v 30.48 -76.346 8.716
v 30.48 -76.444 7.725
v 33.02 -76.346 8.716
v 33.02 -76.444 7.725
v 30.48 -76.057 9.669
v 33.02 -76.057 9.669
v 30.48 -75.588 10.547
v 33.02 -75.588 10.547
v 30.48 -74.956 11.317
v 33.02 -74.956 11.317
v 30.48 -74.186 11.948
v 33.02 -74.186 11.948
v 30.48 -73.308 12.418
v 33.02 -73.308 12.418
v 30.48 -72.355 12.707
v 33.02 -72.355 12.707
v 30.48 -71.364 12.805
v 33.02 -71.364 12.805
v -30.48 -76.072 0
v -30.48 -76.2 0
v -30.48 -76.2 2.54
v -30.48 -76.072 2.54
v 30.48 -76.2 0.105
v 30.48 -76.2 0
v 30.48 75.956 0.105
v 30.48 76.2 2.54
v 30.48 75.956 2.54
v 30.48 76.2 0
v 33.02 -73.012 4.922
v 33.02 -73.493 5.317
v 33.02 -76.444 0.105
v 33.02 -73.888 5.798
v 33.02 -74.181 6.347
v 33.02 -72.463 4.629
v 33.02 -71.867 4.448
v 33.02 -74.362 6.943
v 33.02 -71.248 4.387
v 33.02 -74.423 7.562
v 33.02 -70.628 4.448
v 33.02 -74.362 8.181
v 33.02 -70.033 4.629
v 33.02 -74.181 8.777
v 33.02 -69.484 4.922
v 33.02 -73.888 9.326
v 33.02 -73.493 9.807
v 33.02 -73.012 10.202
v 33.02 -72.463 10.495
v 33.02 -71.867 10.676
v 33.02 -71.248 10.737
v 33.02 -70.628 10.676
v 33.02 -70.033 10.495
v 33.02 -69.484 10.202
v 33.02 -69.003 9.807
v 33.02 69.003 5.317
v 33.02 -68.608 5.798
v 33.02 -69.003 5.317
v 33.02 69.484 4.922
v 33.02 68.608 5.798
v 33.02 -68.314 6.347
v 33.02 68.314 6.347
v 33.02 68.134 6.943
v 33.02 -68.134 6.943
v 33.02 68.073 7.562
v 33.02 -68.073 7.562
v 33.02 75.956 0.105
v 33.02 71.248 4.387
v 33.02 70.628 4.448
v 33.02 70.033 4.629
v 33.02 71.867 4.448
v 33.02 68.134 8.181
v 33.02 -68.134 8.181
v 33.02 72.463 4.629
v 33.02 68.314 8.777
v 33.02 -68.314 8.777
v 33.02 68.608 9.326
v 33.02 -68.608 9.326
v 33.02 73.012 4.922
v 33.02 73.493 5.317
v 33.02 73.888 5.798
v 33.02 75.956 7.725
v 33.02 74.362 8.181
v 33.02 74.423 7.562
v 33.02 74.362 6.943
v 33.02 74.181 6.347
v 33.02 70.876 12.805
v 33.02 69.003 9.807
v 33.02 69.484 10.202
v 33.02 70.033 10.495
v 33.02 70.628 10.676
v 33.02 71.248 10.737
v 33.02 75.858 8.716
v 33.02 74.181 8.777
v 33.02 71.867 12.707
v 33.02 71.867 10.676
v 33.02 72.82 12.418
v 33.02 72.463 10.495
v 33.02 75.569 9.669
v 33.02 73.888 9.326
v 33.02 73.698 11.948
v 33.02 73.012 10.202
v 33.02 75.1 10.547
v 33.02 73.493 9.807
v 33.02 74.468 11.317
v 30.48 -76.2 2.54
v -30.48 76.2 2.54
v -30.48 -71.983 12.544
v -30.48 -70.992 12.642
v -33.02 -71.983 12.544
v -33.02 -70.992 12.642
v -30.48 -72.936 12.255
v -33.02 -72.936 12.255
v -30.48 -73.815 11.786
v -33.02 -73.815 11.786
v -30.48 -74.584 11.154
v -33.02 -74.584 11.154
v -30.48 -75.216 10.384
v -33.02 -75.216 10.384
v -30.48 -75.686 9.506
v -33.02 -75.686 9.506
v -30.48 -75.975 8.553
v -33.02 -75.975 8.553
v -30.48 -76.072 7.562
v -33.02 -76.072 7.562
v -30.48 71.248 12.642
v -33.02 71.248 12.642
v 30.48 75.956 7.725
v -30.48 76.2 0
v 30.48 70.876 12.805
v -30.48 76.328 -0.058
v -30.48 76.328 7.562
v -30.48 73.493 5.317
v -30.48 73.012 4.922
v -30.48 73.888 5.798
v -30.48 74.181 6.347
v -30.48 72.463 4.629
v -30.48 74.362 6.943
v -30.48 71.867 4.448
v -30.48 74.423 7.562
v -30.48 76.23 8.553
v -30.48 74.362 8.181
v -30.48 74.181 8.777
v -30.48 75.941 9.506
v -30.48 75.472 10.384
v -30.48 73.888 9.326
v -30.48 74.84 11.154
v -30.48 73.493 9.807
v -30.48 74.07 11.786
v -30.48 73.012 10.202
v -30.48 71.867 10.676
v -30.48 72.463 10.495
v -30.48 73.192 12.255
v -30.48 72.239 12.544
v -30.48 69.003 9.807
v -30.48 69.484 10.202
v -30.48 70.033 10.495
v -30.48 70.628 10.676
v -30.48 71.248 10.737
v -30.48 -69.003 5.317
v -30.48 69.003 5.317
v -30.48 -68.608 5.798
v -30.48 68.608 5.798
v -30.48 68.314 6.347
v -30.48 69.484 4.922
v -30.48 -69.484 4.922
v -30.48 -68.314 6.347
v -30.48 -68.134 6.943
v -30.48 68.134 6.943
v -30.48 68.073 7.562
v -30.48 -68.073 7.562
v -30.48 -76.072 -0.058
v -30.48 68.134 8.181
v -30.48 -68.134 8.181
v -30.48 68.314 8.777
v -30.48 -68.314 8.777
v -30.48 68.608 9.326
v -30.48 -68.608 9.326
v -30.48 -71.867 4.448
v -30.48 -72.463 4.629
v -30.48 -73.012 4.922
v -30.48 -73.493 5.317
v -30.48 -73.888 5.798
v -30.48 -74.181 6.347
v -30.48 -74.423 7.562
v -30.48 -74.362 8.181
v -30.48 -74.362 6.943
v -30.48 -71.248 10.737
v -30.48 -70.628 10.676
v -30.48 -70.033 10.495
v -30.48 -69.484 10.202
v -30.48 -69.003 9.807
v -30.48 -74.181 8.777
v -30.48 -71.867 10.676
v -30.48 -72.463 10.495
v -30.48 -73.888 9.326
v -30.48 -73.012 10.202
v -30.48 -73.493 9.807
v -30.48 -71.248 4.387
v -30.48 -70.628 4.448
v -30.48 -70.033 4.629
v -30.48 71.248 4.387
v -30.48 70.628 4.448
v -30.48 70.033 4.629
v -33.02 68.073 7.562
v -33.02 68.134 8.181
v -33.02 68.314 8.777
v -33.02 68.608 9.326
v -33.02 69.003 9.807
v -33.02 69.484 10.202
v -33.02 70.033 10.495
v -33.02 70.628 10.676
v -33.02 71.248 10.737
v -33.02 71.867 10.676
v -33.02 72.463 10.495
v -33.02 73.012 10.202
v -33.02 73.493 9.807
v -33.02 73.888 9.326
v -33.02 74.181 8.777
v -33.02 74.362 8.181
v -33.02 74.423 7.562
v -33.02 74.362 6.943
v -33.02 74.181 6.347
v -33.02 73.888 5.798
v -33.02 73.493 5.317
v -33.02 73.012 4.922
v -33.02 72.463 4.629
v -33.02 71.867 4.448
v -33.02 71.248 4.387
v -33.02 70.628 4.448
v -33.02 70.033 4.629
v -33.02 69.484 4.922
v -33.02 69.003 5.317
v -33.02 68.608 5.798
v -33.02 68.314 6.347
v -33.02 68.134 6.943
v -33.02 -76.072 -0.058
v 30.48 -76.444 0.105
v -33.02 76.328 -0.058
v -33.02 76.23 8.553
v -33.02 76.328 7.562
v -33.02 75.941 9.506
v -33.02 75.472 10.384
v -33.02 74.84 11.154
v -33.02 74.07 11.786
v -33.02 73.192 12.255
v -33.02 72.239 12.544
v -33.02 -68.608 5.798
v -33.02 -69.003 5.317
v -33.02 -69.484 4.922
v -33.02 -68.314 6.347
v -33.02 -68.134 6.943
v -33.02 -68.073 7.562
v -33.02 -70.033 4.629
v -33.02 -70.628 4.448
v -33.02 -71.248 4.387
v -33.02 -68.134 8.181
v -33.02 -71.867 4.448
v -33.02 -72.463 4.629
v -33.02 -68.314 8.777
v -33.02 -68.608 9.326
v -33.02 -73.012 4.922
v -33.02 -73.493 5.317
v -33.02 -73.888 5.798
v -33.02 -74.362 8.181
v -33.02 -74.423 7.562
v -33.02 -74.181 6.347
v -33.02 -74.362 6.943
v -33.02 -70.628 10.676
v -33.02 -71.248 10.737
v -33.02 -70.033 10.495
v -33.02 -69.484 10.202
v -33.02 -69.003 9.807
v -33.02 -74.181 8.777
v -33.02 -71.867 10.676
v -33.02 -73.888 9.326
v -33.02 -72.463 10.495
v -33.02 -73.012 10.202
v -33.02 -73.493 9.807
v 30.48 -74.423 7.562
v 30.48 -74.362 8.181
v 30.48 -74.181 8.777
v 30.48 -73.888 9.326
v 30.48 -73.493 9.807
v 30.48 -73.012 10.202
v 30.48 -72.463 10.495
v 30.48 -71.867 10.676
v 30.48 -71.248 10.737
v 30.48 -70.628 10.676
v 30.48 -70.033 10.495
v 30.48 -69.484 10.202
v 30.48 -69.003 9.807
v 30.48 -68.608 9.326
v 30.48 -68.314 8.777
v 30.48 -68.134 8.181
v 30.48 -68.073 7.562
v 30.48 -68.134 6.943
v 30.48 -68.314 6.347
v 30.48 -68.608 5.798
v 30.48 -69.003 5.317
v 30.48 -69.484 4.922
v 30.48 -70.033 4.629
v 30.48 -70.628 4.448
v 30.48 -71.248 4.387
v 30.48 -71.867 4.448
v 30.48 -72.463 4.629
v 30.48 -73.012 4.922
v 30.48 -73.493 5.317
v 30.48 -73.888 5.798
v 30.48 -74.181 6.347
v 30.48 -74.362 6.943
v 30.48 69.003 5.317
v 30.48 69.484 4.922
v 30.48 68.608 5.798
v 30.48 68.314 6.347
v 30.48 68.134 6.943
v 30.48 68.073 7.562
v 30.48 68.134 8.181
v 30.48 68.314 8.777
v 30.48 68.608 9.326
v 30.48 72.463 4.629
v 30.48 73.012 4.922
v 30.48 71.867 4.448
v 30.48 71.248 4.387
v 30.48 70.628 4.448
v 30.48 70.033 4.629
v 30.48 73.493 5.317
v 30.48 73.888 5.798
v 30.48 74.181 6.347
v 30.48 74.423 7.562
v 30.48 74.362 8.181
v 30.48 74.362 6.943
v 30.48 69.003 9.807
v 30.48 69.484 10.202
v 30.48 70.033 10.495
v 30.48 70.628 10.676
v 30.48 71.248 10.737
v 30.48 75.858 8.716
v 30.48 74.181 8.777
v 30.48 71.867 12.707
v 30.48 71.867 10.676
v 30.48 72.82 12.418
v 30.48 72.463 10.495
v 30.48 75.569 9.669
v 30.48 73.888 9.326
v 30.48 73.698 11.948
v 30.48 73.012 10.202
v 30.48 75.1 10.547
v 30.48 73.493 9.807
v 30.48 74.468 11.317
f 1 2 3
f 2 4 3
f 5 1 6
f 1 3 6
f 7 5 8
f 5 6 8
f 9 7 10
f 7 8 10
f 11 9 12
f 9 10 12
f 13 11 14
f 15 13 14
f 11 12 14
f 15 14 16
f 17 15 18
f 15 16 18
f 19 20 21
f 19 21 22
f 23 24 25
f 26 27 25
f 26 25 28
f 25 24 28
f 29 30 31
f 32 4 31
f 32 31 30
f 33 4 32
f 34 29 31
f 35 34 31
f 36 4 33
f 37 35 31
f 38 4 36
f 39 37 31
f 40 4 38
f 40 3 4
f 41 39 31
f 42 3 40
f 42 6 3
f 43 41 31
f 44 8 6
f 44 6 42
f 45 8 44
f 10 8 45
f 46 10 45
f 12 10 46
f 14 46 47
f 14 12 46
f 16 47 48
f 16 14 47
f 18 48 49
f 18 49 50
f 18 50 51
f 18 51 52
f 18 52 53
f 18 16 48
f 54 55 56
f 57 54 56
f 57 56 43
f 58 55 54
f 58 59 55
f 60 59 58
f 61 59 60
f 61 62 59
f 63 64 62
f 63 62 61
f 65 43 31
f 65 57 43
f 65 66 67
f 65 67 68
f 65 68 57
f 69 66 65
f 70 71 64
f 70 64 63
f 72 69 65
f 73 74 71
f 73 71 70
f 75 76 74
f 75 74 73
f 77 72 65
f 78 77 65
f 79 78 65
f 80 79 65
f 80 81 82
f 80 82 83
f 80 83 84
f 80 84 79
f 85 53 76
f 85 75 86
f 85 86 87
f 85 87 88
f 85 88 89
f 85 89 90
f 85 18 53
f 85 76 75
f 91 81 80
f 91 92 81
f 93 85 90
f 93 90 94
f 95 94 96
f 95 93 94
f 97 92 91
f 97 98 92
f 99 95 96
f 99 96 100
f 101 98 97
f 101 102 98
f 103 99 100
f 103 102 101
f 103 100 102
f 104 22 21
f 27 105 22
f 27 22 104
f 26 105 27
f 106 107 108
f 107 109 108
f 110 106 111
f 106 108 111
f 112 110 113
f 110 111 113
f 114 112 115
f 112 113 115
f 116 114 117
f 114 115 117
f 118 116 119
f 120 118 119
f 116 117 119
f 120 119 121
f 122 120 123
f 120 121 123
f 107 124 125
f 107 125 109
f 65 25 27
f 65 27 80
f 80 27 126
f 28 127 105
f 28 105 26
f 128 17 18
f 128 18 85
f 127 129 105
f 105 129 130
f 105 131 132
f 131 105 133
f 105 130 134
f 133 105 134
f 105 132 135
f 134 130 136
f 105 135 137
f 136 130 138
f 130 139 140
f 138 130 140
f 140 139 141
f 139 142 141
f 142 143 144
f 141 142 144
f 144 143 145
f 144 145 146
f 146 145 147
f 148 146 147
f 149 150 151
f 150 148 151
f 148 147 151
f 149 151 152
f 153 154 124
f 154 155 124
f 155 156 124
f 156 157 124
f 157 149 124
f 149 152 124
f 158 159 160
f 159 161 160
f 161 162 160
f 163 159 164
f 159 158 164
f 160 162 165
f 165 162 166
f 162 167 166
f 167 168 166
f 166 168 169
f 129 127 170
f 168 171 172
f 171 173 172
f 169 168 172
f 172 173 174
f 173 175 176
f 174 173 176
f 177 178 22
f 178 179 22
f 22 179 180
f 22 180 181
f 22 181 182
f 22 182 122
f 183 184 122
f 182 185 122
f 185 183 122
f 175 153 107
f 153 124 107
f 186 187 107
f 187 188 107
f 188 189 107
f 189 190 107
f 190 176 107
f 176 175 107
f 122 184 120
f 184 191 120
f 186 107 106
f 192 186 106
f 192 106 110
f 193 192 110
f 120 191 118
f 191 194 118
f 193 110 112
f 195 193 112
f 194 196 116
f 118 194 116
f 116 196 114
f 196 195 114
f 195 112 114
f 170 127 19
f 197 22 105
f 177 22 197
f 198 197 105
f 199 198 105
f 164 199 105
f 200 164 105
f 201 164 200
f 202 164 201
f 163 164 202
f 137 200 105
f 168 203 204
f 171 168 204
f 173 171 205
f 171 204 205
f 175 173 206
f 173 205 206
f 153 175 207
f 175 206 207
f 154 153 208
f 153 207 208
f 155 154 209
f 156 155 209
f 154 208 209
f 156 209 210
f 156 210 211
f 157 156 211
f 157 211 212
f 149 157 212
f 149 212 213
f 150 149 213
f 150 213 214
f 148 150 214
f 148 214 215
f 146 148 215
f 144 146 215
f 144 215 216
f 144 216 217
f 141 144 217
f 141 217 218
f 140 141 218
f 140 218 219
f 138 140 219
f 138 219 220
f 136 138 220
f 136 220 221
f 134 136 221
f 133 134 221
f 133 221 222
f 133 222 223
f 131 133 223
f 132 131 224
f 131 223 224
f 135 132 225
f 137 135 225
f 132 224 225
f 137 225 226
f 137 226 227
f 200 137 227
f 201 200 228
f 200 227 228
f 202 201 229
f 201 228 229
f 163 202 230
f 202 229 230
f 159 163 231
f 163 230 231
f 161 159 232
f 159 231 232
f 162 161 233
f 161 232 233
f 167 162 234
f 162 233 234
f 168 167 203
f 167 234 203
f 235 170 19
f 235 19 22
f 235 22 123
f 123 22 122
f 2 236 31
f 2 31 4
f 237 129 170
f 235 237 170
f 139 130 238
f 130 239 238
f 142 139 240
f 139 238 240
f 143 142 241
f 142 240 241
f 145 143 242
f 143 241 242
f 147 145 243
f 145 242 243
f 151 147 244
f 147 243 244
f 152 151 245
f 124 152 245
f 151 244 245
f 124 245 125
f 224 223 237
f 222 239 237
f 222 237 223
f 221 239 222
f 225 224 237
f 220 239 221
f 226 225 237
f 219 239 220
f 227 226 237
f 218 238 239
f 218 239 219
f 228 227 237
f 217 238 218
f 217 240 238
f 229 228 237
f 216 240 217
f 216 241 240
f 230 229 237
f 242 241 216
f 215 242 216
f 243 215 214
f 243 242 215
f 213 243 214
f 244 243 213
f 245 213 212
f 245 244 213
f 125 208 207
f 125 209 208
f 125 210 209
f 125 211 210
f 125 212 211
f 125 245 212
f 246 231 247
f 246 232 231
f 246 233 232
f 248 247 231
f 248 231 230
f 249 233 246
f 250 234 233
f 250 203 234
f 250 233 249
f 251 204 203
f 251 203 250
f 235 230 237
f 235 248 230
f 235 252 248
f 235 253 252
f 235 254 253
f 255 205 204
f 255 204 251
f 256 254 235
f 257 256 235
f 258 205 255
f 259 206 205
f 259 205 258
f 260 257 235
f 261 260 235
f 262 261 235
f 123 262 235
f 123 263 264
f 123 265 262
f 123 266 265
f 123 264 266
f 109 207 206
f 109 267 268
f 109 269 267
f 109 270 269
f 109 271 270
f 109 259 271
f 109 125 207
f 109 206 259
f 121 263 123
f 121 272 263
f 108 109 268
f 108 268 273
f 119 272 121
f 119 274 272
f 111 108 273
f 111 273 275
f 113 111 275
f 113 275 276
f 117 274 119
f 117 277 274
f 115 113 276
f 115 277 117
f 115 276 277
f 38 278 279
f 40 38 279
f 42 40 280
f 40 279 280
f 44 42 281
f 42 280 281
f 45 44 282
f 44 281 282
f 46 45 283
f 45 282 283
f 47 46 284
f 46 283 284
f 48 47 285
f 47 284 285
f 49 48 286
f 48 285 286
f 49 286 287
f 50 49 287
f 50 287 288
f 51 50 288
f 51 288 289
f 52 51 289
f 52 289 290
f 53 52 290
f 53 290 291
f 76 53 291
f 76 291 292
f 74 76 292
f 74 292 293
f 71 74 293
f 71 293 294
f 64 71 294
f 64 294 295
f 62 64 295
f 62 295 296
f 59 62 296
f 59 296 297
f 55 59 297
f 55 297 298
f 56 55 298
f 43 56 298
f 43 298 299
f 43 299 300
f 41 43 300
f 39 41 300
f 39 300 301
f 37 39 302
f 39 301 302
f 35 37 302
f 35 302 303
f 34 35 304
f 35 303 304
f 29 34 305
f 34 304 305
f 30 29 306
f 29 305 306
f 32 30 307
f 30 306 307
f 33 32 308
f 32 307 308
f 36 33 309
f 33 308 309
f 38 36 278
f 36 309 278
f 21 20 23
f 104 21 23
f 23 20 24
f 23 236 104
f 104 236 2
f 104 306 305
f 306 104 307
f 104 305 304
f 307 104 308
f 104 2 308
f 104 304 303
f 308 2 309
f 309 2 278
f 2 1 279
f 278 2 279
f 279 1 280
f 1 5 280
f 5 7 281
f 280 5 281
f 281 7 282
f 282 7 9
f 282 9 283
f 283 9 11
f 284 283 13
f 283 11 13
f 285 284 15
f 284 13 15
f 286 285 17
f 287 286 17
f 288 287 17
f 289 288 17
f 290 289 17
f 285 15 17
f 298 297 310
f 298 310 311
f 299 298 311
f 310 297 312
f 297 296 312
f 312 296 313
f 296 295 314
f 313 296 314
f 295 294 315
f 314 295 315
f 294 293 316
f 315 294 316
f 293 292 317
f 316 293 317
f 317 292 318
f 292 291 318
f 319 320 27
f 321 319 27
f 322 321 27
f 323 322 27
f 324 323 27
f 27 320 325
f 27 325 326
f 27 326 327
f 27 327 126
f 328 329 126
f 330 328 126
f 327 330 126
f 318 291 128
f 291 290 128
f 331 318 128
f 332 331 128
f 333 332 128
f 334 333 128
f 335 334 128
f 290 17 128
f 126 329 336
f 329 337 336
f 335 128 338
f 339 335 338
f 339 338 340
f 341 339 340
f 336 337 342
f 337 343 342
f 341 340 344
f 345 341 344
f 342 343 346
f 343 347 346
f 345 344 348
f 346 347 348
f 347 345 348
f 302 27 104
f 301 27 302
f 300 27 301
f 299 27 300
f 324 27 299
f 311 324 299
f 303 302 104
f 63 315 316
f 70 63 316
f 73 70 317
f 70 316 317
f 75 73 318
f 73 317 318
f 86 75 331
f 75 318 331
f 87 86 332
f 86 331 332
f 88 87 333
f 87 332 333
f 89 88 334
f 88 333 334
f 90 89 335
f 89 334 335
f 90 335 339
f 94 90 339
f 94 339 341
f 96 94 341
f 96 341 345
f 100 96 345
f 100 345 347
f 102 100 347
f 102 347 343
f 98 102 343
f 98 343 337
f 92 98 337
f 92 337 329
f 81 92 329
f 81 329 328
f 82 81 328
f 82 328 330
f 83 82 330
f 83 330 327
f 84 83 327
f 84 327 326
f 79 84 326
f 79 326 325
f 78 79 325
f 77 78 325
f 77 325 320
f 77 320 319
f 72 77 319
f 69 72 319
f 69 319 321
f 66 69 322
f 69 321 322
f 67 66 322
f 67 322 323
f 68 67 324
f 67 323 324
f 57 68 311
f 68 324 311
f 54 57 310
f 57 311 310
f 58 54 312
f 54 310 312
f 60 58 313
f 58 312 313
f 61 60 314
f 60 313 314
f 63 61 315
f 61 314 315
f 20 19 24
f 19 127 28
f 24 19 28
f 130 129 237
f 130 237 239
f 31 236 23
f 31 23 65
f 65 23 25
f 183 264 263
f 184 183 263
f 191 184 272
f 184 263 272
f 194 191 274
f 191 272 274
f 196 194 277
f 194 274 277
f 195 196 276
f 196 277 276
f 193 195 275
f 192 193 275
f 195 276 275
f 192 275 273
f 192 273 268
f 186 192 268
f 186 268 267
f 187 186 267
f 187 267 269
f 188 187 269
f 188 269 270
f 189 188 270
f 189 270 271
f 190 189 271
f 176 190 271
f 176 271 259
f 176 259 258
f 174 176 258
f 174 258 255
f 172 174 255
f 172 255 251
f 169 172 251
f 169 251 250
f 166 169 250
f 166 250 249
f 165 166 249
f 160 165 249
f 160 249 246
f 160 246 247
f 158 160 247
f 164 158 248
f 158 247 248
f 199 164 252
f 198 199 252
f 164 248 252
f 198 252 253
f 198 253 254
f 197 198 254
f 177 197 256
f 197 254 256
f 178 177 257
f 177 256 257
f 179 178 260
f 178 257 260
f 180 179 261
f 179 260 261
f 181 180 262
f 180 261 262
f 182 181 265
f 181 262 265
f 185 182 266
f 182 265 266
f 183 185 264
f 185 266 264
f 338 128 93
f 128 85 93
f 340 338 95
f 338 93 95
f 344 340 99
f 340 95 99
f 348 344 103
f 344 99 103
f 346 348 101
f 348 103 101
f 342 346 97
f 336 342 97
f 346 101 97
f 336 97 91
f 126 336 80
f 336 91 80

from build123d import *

# Parameters (mm, degrees)
F0_W     = 60.96
F0_H     = 152.4
F1_DEPTH = 2.54
F2_W     = 152.4
F2_H     = 12.7
F3_DEPTH = 2.54
F4_W     = 152.4
F4_H     = 12.7
F5_DEPTH = 2.54
F6_R     = 5.08
F7_R     = 3.175
F8_DEPTH = 90.17


with BuildPart() as f1:
    # F0 (on Top) → F1 (new body)
    with BuildSketch(Plane.XY):
        Rectangle(F0_W, F0_H)
    extrude(amount=F1_DEPTH)

    # F2 (on face) → F3 (join)
    with BuildSketch(Plane.YZ.offset(30.48)):
        with Locations((-0.243933, 6.454543)):
            Rectangle(F2_W, F2_H)
    extrude(amount=F3_DEPTH)

    # F4 (on face) → F5 (join)
    with BuildSketch(Plane(origin=(-30.48, 0, 0), x_dir=(0, -1, 0), z_dir=(-1, 0, 0))):
        with Locations((-0.127775, 6.291921)):
            Rectangle(F4_W, F4_H)
    extrude(amount=F5_DEPTH)

    # F6
    f6_edges = [f1.edges().sort_by_distance(p)[0] for p in [
        (31.75, -76.443933, 12.804543),
        (-31.75, -76.072225, 12.641921),
        (31.75, 75.956067, 12.804543),
        (-31.75, 76.327775, 12.641921),
    ]]
    fillet(f6_edges, radius=F6_R)

    # F7 (on face) → F8 (cut)
    with BuildSketch(Plane(origin=(-33.02, 0, 0), x_dir=(0, -1, 0), z_dir=(-1, 0, 0))):
        with Locations((-71.247775, 7.561921)):
            Circle(F7_R)
        with Locations((71.247775, 7.561921)):
            Circle(F7_R)
    extrude(amount=-F8_DEPTH, mode=Mode.SUBTRACT)


solid = f1.part
